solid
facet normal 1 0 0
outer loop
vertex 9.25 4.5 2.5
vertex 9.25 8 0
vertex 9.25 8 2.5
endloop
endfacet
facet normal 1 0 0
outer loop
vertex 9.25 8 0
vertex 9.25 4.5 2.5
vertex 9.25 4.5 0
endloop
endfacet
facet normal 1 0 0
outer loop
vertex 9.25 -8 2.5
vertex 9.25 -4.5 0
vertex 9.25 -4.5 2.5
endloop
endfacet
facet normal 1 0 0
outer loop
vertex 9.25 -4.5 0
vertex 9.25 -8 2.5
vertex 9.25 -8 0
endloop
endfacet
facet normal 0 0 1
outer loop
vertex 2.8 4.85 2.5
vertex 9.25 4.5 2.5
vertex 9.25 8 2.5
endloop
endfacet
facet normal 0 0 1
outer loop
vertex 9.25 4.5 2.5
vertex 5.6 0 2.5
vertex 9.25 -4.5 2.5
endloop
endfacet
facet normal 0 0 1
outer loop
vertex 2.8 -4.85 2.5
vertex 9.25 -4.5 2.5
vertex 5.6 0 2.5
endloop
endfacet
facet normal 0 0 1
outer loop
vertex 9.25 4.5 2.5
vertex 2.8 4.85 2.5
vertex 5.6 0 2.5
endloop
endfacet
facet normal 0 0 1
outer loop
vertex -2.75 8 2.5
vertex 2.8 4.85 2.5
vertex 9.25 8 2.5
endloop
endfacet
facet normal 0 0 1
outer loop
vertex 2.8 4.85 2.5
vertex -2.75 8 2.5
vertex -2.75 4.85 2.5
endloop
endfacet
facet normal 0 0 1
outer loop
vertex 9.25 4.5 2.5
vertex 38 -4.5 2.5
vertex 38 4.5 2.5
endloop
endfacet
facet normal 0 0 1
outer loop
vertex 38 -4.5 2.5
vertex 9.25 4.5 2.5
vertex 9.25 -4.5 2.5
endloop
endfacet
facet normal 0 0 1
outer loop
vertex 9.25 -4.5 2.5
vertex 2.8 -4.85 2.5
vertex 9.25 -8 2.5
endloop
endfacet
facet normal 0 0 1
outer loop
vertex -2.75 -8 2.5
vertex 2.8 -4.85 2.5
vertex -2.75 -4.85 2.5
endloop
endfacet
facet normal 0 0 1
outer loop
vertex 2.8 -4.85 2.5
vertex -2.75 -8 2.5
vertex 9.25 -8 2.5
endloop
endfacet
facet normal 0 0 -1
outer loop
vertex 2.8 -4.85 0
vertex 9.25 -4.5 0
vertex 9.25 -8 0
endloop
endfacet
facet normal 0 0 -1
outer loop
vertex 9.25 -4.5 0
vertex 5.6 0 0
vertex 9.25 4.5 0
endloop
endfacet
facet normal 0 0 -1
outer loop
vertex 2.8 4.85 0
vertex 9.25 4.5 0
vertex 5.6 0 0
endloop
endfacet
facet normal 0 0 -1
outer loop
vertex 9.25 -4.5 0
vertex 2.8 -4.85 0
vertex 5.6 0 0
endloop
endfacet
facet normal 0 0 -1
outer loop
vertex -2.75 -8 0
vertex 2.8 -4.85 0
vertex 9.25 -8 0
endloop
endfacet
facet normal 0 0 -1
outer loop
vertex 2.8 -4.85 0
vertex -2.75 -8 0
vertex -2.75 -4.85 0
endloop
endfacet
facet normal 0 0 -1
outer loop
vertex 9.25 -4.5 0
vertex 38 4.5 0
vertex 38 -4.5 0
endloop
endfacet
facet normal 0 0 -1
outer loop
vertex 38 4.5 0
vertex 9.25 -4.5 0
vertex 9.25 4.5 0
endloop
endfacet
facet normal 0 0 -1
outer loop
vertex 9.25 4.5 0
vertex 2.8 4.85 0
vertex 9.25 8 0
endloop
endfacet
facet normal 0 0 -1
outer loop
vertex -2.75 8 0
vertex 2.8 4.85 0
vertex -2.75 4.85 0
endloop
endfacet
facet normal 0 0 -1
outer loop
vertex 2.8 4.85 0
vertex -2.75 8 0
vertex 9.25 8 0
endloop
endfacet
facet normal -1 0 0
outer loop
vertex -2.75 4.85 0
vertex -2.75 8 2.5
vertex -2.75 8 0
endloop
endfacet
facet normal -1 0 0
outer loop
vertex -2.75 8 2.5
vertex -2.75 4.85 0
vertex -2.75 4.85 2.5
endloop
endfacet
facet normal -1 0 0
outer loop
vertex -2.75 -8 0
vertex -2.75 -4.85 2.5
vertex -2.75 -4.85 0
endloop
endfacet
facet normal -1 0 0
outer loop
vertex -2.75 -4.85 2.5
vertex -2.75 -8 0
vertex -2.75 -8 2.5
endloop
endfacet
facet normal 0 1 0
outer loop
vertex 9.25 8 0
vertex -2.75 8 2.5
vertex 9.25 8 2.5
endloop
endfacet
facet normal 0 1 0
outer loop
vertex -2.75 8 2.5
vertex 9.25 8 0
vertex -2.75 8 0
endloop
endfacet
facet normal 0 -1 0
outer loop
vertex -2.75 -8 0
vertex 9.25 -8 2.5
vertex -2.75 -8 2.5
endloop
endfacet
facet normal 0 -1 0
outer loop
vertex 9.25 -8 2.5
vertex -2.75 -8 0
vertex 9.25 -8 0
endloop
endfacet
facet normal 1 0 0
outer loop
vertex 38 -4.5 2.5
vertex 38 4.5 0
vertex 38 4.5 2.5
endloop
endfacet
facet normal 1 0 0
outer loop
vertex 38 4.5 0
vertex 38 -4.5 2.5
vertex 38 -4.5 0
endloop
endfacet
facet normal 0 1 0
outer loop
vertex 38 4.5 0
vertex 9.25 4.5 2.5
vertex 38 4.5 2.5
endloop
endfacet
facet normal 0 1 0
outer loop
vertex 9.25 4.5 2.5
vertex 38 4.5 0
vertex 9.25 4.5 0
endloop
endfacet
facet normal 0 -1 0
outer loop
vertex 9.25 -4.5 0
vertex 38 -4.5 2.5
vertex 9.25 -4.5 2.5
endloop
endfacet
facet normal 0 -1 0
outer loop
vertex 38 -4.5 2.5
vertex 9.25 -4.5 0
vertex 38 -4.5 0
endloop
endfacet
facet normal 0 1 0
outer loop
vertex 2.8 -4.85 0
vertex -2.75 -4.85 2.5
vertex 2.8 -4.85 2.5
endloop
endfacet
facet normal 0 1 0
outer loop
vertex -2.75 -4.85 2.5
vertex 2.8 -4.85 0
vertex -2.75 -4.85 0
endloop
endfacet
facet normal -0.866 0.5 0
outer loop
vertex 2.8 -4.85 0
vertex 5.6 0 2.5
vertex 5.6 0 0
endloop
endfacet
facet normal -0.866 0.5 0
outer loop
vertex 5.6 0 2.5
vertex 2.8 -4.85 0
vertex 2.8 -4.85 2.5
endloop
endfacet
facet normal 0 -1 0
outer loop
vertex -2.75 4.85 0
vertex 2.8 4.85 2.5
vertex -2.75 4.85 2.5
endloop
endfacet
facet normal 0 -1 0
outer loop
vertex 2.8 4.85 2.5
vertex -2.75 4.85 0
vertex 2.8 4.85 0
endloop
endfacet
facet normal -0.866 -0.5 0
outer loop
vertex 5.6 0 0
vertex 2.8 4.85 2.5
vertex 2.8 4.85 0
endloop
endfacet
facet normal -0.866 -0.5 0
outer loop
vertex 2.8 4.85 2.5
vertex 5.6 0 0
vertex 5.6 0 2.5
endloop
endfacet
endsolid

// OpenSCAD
h = 2.5;
inside = 10;
margin = 3;

difference() {
        union() {
                translate([3.25, 0, h/2])
                        cube(size=[12,inside + margin * 2, h], center = true);
                translate([23, 0, h/2])
                        cube(size=[30, margin * 3, h], center = true);
        }

        translate([0, 0, h/2]) rotate([0, 0, 0])
                cylinder(h = h * 2, r = 11.2/2, center = true, $fa=60);

}
